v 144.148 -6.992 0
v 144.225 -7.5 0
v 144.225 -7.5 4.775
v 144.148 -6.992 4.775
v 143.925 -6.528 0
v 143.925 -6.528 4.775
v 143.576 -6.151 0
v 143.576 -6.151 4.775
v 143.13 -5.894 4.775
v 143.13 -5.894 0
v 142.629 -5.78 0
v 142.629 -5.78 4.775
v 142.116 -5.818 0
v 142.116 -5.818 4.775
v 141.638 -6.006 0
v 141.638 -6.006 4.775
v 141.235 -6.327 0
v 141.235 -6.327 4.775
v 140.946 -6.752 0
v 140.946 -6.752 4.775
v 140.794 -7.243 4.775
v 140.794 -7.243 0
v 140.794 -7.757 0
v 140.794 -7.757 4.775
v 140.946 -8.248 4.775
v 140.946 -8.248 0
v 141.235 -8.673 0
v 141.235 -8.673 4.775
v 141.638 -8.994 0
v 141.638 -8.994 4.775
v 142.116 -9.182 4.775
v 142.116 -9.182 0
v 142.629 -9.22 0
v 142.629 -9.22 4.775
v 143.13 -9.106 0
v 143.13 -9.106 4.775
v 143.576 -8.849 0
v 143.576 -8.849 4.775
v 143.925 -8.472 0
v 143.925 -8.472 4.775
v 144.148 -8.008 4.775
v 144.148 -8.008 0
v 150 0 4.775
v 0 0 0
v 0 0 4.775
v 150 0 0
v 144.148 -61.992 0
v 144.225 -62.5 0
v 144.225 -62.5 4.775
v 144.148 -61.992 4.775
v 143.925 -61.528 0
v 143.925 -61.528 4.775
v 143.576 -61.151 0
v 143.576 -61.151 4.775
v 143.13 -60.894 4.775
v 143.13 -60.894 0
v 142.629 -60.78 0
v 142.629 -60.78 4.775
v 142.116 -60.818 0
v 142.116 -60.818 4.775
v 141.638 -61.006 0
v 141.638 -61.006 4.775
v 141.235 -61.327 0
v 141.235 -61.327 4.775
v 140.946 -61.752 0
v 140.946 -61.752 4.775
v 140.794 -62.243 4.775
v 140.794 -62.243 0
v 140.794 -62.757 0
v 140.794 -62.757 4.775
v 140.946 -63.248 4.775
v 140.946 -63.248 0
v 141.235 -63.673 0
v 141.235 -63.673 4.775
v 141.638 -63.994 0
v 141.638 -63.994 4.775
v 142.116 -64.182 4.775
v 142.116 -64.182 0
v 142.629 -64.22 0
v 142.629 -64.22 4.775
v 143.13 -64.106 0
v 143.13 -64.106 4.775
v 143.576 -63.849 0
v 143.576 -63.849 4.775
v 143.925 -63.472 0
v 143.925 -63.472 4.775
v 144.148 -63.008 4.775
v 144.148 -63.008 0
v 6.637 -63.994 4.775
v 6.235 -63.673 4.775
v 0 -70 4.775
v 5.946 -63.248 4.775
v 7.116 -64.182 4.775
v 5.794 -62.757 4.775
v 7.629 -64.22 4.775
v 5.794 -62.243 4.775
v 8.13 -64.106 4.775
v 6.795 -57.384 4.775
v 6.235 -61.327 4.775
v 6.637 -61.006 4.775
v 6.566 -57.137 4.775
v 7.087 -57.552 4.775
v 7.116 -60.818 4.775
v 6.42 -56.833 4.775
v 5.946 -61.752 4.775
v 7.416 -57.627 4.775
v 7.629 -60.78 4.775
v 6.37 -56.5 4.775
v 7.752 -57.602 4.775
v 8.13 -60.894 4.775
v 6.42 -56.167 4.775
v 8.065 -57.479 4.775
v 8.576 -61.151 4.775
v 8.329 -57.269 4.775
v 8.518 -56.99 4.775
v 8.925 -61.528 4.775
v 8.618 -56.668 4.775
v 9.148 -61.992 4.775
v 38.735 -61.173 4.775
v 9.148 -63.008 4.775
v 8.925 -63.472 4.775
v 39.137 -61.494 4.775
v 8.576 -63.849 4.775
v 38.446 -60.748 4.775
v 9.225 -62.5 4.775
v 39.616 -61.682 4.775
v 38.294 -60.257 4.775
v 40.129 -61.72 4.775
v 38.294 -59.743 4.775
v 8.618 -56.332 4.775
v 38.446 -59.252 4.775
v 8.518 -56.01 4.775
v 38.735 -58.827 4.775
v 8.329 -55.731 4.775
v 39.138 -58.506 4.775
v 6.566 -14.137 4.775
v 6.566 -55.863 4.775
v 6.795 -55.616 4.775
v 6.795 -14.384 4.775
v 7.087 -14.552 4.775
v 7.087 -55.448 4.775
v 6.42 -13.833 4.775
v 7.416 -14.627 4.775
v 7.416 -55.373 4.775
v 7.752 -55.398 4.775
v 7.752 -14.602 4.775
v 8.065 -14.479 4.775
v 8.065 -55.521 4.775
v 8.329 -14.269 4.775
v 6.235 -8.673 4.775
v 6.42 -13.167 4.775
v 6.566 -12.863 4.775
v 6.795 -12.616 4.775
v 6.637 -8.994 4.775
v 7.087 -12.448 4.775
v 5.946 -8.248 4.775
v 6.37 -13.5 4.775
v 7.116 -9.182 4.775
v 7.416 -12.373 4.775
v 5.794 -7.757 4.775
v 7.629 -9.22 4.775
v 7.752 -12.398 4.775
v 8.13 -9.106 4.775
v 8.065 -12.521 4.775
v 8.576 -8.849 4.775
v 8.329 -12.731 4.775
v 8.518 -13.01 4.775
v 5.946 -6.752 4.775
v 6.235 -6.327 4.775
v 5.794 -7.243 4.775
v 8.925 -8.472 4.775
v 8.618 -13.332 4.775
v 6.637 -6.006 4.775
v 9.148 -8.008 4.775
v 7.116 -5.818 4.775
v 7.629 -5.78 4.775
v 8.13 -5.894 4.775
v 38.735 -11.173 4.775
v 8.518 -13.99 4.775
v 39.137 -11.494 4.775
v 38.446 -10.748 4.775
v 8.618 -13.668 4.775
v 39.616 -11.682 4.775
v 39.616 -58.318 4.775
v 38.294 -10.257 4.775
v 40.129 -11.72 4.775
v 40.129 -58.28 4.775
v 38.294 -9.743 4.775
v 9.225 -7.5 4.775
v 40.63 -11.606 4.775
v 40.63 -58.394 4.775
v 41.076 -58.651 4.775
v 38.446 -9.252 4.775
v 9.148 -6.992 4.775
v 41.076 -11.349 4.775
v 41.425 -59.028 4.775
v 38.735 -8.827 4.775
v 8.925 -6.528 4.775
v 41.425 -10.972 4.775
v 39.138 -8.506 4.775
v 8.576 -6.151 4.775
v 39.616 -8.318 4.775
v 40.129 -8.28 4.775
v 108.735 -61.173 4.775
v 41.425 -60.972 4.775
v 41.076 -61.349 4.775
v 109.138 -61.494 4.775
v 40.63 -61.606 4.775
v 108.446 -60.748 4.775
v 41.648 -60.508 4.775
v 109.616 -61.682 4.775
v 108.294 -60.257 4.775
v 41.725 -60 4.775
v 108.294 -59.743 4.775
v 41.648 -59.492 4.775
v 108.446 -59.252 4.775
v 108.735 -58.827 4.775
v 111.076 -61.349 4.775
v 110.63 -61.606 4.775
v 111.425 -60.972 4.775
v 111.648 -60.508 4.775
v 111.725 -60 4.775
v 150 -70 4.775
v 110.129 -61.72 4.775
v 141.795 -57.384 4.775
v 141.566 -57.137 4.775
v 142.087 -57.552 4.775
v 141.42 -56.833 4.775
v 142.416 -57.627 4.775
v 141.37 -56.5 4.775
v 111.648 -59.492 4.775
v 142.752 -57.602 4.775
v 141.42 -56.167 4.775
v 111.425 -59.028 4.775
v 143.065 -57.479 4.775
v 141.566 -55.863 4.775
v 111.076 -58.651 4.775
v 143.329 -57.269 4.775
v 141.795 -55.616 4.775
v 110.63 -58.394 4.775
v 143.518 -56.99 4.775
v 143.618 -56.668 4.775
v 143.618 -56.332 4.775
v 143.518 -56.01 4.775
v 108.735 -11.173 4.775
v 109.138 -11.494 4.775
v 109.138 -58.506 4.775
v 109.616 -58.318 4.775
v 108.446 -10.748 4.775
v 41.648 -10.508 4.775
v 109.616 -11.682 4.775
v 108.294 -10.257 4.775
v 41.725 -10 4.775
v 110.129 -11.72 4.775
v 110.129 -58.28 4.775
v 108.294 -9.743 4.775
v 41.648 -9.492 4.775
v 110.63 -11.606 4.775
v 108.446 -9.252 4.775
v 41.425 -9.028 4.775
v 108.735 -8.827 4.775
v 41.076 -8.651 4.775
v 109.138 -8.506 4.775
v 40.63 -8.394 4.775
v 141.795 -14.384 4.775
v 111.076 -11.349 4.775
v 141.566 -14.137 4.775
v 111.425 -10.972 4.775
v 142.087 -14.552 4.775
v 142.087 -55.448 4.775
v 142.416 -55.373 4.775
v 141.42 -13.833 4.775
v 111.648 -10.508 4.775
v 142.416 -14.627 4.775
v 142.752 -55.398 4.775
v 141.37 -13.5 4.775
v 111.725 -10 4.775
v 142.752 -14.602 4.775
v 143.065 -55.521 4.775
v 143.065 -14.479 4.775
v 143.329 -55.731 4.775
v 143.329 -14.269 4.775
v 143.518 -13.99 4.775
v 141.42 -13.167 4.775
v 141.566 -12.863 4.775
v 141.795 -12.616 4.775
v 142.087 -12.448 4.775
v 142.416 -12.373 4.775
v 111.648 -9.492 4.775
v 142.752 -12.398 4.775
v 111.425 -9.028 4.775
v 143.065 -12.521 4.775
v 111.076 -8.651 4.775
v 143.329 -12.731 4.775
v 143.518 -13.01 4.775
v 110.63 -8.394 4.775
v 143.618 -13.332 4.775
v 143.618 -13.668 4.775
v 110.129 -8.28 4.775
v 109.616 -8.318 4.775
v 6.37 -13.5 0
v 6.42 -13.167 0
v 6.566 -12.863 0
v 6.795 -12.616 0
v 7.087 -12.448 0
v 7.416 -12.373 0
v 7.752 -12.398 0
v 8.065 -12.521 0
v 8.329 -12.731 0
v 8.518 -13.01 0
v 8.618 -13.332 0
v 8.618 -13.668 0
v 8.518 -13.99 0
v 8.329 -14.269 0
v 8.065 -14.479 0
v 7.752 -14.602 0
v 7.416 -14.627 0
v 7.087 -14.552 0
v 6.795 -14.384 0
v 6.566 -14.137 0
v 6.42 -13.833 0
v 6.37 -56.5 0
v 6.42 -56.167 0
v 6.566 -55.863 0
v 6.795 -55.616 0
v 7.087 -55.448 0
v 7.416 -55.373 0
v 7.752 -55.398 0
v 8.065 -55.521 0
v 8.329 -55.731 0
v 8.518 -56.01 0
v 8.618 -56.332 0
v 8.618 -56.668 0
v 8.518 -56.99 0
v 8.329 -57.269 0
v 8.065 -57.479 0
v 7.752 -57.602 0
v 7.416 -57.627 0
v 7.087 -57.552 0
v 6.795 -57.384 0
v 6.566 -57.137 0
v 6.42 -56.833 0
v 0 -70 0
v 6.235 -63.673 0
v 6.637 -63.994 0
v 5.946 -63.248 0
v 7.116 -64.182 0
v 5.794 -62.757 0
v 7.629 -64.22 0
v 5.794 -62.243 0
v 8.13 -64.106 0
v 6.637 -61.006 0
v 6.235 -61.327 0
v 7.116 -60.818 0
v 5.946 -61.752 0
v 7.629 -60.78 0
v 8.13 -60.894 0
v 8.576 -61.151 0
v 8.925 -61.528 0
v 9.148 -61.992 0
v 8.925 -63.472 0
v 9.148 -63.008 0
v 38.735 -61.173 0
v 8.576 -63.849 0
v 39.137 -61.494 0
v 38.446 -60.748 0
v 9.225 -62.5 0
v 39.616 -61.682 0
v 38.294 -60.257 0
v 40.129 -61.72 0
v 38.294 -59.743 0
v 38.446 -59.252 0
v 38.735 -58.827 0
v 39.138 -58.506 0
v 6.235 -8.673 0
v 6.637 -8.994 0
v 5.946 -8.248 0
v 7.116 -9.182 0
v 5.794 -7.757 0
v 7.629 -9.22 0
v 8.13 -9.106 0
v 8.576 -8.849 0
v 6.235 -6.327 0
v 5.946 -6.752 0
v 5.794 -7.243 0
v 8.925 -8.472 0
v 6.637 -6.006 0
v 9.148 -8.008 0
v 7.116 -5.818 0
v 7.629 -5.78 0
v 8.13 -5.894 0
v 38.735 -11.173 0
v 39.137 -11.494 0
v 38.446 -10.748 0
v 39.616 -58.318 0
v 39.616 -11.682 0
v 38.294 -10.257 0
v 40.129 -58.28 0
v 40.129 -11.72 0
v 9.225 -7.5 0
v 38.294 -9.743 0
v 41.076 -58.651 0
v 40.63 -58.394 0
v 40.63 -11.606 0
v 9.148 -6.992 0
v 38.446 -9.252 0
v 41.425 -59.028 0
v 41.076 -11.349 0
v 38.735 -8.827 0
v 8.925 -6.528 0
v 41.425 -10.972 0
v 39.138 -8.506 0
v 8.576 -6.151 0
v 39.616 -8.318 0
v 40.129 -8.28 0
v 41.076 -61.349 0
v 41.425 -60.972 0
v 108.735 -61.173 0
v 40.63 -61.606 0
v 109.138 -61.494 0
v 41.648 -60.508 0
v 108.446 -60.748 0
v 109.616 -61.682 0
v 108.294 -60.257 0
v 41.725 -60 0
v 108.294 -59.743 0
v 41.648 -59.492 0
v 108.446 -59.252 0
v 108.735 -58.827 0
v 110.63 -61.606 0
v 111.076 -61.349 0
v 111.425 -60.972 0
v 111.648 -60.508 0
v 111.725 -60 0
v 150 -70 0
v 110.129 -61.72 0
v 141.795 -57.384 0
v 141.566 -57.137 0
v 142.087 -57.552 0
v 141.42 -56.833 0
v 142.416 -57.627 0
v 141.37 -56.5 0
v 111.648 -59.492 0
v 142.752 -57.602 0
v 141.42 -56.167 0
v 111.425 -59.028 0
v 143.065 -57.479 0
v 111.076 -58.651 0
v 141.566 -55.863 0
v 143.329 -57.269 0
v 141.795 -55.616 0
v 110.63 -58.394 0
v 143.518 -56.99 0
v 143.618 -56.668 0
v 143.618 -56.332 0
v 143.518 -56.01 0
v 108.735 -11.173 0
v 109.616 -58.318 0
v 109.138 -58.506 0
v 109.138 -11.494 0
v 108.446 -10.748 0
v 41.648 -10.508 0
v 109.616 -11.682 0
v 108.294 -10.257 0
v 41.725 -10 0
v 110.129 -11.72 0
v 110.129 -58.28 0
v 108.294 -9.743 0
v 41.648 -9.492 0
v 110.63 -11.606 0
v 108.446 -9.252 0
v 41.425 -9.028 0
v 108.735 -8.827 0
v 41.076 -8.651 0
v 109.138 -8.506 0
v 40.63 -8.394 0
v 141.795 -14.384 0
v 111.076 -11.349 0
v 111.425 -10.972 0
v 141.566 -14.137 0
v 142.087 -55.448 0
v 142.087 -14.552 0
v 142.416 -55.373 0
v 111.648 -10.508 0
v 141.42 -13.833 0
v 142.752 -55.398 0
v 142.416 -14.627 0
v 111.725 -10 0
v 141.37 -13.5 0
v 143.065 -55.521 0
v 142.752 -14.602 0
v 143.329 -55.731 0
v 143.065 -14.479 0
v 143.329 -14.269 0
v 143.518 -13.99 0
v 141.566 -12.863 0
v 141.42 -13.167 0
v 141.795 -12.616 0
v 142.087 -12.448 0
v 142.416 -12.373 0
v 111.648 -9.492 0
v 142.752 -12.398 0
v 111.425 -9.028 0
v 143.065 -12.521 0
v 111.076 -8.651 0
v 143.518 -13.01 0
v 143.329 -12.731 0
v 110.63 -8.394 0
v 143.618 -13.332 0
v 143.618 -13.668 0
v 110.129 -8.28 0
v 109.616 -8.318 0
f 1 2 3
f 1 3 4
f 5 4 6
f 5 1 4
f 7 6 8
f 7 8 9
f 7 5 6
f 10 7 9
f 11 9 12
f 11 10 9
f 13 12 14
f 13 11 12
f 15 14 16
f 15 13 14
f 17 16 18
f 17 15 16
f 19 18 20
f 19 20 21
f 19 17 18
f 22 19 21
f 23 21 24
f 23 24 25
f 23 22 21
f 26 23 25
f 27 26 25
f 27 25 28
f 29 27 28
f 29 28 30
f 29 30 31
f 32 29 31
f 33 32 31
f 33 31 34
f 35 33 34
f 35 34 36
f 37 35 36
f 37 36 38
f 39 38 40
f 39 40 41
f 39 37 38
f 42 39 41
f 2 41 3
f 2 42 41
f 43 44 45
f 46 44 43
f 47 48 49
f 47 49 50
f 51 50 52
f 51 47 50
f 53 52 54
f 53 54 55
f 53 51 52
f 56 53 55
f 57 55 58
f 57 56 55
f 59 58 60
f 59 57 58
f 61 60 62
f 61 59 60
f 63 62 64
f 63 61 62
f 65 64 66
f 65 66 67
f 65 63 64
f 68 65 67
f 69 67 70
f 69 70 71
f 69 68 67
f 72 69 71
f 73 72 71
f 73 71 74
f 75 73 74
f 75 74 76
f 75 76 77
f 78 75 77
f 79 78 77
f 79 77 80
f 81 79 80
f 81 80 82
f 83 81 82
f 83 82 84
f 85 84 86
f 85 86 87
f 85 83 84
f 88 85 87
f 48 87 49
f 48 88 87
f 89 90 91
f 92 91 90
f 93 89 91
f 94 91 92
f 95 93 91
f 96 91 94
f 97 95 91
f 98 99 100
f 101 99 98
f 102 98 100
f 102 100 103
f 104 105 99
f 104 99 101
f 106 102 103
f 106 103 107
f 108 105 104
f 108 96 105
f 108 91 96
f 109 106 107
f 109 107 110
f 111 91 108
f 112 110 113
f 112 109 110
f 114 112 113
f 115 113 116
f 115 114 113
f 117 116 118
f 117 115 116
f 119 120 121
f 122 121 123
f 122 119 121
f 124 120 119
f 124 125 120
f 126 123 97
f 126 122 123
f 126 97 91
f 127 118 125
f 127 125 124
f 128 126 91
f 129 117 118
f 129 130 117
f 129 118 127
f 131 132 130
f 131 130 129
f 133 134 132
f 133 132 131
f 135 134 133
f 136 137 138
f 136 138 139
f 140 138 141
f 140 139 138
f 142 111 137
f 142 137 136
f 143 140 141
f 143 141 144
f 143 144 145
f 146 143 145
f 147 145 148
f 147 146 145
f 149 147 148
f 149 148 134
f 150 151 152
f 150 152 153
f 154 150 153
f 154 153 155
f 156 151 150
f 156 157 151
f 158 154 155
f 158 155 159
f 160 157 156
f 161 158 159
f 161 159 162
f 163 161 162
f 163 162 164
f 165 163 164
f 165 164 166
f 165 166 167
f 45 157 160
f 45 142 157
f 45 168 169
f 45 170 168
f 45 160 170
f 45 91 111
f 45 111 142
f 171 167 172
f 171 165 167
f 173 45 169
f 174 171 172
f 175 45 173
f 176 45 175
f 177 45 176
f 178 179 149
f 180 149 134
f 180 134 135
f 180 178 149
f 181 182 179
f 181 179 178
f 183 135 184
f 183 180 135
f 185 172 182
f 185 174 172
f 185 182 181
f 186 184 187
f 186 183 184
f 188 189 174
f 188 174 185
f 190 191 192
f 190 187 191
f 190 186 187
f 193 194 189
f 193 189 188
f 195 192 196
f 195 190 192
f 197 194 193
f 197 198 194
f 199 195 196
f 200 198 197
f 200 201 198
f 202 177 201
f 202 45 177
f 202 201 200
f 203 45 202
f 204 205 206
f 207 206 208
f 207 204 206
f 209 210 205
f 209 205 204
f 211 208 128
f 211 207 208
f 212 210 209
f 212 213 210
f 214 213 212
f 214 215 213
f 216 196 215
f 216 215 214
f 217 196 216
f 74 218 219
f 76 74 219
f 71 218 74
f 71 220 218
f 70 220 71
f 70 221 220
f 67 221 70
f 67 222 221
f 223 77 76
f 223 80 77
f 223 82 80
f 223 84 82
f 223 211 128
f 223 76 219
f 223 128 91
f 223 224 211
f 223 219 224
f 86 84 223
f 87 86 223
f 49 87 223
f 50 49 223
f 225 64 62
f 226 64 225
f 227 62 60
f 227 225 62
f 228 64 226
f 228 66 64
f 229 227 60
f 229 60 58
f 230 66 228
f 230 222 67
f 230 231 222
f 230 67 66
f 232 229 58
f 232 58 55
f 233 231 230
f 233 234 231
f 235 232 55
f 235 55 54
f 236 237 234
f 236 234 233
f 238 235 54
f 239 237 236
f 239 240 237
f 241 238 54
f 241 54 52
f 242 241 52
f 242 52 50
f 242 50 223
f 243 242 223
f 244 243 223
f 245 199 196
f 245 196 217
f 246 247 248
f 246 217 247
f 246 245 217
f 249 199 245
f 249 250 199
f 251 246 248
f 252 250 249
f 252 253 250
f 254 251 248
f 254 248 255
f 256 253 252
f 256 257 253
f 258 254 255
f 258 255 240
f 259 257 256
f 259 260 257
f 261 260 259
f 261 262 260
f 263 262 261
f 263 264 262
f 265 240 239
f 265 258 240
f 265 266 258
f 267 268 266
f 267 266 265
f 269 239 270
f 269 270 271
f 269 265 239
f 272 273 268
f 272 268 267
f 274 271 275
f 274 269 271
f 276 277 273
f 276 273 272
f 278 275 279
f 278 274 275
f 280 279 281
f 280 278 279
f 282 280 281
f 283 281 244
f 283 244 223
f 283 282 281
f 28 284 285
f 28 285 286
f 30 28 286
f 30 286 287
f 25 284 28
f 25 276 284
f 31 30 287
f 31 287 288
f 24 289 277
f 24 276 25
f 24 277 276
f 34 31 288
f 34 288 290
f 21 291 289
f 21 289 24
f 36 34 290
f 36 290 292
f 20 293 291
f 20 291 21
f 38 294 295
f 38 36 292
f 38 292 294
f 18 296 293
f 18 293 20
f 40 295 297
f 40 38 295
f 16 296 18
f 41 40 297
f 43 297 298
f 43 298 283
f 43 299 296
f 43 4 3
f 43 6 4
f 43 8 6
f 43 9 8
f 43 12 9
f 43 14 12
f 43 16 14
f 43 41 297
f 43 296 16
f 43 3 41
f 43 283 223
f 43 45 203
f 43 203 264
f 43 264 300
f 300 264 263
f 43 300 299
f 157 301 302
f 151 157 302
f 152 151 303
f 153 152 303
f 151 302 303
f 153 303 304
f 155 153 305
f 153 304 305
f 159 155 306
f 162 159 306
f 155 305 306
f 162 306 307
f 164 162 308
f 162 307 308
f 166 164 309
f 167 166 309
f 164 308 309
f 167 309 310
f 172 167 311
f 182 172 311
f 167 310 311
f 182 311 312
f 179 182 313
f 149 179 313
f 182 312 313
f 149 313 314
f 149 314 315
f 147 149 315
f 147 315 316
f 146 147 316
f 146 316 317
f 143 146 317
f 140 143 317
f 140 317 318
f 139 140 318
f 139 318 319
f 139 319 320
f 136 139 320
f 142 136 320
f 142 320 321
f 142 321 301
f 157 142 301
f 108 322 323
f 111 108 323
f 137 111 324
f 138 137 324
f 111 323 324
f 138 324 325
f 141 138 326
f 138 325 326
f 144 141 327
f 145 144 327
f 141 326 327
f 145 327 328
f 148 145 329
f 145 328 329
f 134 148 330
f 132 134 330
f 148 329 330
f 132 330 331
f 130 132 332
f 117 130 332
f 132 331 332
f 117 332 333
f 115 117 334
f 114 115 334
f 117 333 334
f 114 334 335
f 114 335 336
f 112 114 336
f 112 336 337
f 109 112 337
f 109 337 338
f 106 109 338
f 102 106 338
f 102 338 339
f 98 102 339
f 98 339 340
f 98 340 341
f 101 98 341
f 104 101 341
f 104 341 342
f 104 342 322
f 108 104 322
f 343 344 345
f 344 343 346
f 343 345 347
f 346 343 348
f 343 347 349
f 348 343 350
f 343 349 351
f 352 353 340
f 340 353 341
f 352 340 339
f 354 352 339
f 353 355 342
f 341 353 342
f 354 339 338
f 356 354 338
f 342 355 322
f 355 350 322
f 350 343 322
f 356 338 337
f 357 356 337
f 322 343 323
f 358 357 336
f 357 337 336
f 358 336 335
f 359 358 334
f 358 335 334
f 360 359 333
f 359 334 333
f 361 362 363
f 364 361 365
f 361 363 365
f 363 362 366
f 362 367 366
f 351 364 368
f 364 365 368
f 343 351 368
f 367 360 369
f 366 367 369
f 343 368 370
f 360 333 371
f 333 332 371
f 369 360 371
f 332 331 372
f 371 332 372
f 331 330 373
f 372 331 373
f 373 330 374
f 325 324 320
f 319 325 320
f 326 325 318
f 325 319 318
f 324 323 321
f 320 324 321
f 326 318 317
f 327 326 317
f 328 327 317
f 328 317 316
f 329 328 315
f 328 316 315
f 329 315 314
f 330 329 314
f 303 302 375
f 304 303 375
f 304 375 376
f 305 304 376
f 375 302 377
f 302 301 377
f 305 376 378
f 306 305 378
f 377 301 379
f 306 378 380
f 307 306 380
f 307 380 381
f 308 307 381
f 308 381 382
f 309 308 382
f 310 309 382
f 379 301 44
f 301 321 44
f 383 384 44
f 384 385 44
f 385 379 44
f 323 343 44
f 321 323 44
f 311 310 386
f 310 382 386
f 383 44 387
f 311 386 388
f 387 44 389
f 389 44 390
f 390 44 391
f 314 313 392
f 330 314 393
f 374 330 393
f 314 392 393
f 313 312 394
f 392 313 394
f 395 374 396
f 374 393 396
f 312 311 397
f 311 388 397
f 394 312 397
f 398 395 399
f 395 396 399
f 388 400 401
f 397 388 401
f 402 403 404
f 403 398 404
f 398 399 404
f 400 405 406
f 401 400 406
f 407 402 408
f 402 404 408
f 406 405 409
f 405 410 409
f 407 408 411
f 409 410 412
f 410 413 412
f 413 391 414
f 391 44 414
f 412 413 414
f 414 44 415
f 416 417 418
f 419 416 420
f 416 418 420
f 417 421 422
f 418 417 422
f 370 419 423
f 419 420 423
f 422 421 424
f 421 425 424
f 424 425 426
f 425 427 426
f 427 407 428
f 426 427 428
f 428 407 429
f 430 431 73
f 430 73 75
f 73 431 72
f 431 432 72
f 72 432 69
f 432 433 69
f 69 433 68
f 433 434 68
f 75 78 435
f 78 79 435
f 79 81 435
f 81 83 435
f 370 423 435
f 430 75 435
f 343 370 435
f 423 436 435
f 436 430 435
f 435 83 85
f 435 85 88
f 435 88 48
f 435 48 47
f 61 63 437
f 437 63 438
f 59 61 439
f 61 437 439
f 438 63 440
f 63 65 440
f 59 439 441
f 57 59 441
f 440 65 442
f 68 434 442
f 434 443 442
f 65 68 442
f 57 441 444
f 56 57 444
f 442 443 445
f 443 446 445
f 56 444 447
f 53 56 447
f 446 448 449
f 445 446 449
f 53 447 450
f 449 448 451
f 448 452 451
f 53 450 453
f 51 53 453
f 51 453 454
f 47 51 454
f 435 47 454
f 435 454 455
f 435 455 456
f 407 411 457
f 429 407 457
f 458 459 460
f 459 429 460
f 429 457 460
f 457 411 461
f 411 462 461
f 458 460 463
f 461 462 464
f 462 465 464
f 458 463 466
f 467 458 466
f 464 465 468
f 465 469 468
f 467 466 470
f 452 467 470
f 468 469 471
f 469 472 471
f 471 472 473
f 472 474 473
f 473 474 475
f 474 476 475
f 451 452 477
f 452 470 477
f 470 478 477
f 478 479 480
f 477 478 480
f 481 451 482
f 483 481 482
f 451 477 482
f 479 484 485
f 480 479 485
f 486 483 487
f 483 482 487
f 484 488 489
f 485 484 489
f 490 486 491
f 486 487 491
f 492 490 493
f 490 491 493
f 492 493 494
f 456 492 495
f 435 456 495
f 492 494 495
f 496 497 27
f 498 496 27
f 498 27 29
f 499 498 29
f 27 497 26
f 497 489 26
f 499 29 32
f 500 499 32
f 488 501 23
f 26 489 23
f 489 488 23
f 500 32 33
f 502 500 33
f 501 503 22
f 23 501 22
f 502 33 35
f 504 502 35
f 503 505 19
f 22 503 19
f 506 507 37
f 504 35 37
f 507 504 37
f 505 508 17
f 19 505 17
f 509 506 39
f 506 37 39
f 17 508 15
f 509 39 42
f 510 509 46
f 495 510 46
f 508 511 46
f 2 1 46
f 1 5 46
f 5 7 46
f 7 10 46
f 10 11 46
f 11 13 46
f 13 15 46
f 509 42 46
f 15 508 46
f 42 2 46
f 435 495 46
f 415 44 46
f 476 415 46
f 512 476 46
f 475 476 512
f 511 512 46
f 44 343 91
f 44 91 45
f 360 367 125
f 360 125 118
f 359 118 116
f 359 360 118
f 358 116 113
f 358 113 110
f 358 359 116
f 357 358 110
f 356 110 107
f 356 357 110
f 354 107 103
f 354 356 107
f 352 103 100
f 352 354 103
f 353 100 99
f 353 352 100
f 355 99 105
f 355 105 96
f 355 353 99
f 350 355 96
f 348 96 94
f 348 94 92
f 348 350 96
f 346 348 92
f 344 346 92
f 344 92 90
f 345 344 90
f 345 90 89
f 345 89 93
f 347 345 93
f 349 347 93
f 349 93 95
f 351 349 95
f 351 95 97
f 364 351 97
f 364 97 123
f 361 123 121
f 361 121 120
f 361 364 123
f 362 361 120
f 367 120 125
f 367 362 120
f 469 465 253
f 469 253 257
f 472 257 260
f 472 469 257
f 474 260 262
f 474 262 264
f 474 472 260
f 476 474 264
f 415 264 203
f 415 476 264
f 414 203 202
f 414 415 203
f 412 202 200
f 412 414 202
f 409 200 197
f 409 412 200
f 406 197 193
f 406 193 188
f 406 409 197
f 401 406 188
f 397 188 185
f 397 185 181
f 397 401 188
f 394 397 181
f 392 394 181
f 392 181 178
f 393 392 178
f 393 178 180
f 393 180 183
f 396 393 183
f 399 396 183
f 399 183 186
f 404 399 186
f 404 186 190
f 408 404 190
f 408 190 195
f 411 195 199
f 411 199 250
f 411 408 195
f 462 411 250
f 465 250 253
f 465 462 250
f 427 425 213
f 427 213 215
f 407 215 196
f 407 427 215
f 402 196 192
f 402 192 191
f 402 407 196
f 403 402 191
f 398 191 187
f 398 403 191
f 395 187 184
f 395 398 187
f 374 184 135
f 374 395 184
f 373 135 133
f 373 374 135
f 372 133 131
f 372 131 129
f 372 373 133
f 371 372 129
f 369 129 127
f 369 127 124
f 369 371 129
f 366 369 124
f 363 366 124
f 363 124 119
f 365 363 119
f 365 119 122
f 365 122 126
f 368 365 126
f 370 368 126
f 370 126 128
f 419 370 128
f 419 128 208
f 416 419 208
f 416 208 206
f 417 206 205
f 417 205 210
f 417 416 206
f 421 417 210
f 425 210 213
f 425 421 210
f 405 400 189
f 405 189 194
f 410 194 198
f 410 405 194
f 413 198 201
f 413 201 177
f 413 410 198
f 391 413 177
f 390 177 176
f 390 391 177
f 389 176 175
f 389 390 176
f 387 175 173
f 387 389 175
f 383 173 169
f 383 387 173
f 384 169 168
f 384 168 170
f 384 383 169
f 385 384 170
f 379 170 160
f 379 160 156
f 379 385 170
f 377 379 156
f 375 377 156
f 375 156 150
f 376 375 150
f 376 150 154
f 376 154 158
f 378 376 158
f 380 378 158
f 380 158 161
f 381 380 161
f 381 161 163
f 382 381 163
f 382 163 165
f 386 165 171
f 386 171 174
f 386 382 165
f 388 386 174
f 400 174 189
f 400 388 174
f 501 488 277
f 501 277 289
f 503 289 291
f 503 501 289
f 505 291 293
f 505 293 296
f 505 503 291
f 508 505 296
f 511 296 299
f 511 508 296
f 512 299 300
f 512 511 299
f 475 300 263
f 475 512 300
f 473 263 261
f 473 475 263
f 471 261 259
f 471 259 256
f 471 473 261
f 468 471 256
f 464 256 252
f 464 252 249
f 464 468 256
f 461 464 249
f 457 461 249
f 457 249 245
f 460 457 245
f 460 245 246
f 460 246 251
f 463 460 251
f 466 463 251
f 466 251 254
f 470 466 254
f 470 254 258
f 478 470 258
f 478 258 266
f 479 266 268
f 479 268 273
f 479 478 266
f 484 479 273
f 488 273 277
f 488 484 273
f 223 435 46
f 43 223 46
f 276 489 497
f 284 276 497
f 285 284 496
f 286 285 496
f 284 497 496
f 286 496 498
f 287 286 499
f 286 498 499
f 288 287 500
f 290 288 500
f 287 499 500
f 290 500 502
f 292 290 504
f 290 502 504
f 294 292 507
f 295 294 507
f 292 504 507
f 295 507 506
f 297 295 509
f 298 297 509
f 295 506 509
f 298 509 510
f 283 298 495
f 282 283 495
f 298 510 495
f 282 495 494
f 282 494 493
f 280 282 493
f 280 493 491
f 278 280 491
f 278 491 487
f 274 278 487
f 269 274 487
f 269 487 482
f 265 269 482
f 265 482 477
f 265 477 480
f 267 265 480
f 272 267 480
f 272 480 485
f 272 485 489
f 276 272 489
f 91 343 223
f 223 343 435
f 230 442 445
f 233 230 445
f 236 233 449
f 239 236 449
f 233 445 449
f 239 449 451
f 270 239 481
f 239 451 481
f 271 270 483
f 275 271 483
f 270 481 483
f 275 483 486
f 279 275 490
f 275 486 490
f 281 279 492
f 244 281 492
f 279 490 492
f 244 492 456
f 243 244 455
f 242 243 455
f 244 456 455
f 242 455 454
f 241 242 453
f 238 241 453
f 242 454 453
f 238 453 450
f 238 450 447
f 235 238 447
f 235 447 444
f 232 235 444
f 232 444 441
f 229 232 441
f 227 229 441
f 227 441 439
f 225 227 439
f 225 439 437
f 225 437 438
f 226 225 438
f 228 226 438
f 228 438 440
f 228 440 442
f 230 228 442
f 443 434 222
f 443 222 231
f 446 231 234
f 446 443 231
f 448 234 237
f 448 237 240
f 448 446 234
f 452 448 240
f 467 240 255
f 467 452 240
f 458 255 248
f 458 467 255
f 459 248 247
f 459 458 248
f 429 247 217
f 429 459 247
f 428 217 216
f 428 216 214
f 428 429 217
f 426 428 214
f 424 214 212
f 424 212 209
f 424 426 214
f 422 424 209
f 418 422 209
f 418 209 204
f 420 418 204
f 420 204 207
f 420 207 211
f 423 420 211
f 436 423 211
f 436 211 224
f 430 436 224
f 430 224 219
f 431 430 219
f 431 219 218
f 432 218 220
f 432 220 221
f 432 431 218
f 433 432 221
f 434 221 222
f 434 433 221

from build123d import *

# Parameters (mm, degrees)
SKETCH1_W             = 150
SKETCH1_H             = 70
SKETCH1_R             = 1.725
SKETCH1_R_2           = 1.13
BOSS_EXTRUDE1_DEPTH   = 4.7752
F_4_40_TAPPED_HOLE1_D = 2.2606


with BuildPart() as part:
    # Sketch1 → Boss-Extrude1 (new body)
    with BuildSketch(Plane.XY):
        with Locations((75, -35)):
            Rectangle(SKETCH1_W, SKETCH1_H)
        with Locations((7.5, -7.5)):
            Circle(SKETCH1_R, mode=Mode.SUBTRACT)
        with Locations((142.5, -7.5)):
            Circle(SKETCH1_R, mode=Mode.SUBTRACT)
        with Locations((142.5, -62.5)):
            Circle(SKETCH1_R, mode=Mode.SUBTRACT)
        with Locations((7.5, -62.5)):
            Circle(SKETCH1_R, mode=Mode.SUBTRACT)
        with Locations((7.5, -13.5)):
            Circle(SKETCH1_R_2, mode=Mode.SUBTRACT)
        with Locations((142.5, -13.5)):
            Circle(SKETCH1_R_2, mode=Mode.SUBTRACT)
        with Locations((142.5, -56.5)):
            Circle(SKETCH1_R_2, mode=Mode.SUBTRACT)
        with Locations((7.5, -56.5)):
            Circle(SKETCH1_R_2, mode=Mode.SUBTRACT)
        with Locations((40, -10)):
            Circle(SKETCH1_R, mode=Mode.SUBTRACT)
        with Locations((40, -60)):
            Circle(SKETCH1_R, mode=Mode.SUBTRACT)
        with Locations((110, -10)):
            Circle(SKETCH1_R, mode=Mode.SUBTRACT)
        with Locations((110, -60)):
            Circle(SKETCH1_R, mode=Mode.SUBTRACT)
    extrude(amount=BOSS_EXTRUDE1_DEPTH)

    # #4-40 Tapped Hole1 (through all)
    with Locations(Plane(origin=(7.5, -13.5, 4.7752), x_dir=(1, 0, 0), z_dir=(0, 0, 1))):
        with Locations((0, 0), (0, -43), (135, -43), (135, 0)):
            Hole(F_4_40_TAPPED_HOLE1_D / 2)


solid = part.part
